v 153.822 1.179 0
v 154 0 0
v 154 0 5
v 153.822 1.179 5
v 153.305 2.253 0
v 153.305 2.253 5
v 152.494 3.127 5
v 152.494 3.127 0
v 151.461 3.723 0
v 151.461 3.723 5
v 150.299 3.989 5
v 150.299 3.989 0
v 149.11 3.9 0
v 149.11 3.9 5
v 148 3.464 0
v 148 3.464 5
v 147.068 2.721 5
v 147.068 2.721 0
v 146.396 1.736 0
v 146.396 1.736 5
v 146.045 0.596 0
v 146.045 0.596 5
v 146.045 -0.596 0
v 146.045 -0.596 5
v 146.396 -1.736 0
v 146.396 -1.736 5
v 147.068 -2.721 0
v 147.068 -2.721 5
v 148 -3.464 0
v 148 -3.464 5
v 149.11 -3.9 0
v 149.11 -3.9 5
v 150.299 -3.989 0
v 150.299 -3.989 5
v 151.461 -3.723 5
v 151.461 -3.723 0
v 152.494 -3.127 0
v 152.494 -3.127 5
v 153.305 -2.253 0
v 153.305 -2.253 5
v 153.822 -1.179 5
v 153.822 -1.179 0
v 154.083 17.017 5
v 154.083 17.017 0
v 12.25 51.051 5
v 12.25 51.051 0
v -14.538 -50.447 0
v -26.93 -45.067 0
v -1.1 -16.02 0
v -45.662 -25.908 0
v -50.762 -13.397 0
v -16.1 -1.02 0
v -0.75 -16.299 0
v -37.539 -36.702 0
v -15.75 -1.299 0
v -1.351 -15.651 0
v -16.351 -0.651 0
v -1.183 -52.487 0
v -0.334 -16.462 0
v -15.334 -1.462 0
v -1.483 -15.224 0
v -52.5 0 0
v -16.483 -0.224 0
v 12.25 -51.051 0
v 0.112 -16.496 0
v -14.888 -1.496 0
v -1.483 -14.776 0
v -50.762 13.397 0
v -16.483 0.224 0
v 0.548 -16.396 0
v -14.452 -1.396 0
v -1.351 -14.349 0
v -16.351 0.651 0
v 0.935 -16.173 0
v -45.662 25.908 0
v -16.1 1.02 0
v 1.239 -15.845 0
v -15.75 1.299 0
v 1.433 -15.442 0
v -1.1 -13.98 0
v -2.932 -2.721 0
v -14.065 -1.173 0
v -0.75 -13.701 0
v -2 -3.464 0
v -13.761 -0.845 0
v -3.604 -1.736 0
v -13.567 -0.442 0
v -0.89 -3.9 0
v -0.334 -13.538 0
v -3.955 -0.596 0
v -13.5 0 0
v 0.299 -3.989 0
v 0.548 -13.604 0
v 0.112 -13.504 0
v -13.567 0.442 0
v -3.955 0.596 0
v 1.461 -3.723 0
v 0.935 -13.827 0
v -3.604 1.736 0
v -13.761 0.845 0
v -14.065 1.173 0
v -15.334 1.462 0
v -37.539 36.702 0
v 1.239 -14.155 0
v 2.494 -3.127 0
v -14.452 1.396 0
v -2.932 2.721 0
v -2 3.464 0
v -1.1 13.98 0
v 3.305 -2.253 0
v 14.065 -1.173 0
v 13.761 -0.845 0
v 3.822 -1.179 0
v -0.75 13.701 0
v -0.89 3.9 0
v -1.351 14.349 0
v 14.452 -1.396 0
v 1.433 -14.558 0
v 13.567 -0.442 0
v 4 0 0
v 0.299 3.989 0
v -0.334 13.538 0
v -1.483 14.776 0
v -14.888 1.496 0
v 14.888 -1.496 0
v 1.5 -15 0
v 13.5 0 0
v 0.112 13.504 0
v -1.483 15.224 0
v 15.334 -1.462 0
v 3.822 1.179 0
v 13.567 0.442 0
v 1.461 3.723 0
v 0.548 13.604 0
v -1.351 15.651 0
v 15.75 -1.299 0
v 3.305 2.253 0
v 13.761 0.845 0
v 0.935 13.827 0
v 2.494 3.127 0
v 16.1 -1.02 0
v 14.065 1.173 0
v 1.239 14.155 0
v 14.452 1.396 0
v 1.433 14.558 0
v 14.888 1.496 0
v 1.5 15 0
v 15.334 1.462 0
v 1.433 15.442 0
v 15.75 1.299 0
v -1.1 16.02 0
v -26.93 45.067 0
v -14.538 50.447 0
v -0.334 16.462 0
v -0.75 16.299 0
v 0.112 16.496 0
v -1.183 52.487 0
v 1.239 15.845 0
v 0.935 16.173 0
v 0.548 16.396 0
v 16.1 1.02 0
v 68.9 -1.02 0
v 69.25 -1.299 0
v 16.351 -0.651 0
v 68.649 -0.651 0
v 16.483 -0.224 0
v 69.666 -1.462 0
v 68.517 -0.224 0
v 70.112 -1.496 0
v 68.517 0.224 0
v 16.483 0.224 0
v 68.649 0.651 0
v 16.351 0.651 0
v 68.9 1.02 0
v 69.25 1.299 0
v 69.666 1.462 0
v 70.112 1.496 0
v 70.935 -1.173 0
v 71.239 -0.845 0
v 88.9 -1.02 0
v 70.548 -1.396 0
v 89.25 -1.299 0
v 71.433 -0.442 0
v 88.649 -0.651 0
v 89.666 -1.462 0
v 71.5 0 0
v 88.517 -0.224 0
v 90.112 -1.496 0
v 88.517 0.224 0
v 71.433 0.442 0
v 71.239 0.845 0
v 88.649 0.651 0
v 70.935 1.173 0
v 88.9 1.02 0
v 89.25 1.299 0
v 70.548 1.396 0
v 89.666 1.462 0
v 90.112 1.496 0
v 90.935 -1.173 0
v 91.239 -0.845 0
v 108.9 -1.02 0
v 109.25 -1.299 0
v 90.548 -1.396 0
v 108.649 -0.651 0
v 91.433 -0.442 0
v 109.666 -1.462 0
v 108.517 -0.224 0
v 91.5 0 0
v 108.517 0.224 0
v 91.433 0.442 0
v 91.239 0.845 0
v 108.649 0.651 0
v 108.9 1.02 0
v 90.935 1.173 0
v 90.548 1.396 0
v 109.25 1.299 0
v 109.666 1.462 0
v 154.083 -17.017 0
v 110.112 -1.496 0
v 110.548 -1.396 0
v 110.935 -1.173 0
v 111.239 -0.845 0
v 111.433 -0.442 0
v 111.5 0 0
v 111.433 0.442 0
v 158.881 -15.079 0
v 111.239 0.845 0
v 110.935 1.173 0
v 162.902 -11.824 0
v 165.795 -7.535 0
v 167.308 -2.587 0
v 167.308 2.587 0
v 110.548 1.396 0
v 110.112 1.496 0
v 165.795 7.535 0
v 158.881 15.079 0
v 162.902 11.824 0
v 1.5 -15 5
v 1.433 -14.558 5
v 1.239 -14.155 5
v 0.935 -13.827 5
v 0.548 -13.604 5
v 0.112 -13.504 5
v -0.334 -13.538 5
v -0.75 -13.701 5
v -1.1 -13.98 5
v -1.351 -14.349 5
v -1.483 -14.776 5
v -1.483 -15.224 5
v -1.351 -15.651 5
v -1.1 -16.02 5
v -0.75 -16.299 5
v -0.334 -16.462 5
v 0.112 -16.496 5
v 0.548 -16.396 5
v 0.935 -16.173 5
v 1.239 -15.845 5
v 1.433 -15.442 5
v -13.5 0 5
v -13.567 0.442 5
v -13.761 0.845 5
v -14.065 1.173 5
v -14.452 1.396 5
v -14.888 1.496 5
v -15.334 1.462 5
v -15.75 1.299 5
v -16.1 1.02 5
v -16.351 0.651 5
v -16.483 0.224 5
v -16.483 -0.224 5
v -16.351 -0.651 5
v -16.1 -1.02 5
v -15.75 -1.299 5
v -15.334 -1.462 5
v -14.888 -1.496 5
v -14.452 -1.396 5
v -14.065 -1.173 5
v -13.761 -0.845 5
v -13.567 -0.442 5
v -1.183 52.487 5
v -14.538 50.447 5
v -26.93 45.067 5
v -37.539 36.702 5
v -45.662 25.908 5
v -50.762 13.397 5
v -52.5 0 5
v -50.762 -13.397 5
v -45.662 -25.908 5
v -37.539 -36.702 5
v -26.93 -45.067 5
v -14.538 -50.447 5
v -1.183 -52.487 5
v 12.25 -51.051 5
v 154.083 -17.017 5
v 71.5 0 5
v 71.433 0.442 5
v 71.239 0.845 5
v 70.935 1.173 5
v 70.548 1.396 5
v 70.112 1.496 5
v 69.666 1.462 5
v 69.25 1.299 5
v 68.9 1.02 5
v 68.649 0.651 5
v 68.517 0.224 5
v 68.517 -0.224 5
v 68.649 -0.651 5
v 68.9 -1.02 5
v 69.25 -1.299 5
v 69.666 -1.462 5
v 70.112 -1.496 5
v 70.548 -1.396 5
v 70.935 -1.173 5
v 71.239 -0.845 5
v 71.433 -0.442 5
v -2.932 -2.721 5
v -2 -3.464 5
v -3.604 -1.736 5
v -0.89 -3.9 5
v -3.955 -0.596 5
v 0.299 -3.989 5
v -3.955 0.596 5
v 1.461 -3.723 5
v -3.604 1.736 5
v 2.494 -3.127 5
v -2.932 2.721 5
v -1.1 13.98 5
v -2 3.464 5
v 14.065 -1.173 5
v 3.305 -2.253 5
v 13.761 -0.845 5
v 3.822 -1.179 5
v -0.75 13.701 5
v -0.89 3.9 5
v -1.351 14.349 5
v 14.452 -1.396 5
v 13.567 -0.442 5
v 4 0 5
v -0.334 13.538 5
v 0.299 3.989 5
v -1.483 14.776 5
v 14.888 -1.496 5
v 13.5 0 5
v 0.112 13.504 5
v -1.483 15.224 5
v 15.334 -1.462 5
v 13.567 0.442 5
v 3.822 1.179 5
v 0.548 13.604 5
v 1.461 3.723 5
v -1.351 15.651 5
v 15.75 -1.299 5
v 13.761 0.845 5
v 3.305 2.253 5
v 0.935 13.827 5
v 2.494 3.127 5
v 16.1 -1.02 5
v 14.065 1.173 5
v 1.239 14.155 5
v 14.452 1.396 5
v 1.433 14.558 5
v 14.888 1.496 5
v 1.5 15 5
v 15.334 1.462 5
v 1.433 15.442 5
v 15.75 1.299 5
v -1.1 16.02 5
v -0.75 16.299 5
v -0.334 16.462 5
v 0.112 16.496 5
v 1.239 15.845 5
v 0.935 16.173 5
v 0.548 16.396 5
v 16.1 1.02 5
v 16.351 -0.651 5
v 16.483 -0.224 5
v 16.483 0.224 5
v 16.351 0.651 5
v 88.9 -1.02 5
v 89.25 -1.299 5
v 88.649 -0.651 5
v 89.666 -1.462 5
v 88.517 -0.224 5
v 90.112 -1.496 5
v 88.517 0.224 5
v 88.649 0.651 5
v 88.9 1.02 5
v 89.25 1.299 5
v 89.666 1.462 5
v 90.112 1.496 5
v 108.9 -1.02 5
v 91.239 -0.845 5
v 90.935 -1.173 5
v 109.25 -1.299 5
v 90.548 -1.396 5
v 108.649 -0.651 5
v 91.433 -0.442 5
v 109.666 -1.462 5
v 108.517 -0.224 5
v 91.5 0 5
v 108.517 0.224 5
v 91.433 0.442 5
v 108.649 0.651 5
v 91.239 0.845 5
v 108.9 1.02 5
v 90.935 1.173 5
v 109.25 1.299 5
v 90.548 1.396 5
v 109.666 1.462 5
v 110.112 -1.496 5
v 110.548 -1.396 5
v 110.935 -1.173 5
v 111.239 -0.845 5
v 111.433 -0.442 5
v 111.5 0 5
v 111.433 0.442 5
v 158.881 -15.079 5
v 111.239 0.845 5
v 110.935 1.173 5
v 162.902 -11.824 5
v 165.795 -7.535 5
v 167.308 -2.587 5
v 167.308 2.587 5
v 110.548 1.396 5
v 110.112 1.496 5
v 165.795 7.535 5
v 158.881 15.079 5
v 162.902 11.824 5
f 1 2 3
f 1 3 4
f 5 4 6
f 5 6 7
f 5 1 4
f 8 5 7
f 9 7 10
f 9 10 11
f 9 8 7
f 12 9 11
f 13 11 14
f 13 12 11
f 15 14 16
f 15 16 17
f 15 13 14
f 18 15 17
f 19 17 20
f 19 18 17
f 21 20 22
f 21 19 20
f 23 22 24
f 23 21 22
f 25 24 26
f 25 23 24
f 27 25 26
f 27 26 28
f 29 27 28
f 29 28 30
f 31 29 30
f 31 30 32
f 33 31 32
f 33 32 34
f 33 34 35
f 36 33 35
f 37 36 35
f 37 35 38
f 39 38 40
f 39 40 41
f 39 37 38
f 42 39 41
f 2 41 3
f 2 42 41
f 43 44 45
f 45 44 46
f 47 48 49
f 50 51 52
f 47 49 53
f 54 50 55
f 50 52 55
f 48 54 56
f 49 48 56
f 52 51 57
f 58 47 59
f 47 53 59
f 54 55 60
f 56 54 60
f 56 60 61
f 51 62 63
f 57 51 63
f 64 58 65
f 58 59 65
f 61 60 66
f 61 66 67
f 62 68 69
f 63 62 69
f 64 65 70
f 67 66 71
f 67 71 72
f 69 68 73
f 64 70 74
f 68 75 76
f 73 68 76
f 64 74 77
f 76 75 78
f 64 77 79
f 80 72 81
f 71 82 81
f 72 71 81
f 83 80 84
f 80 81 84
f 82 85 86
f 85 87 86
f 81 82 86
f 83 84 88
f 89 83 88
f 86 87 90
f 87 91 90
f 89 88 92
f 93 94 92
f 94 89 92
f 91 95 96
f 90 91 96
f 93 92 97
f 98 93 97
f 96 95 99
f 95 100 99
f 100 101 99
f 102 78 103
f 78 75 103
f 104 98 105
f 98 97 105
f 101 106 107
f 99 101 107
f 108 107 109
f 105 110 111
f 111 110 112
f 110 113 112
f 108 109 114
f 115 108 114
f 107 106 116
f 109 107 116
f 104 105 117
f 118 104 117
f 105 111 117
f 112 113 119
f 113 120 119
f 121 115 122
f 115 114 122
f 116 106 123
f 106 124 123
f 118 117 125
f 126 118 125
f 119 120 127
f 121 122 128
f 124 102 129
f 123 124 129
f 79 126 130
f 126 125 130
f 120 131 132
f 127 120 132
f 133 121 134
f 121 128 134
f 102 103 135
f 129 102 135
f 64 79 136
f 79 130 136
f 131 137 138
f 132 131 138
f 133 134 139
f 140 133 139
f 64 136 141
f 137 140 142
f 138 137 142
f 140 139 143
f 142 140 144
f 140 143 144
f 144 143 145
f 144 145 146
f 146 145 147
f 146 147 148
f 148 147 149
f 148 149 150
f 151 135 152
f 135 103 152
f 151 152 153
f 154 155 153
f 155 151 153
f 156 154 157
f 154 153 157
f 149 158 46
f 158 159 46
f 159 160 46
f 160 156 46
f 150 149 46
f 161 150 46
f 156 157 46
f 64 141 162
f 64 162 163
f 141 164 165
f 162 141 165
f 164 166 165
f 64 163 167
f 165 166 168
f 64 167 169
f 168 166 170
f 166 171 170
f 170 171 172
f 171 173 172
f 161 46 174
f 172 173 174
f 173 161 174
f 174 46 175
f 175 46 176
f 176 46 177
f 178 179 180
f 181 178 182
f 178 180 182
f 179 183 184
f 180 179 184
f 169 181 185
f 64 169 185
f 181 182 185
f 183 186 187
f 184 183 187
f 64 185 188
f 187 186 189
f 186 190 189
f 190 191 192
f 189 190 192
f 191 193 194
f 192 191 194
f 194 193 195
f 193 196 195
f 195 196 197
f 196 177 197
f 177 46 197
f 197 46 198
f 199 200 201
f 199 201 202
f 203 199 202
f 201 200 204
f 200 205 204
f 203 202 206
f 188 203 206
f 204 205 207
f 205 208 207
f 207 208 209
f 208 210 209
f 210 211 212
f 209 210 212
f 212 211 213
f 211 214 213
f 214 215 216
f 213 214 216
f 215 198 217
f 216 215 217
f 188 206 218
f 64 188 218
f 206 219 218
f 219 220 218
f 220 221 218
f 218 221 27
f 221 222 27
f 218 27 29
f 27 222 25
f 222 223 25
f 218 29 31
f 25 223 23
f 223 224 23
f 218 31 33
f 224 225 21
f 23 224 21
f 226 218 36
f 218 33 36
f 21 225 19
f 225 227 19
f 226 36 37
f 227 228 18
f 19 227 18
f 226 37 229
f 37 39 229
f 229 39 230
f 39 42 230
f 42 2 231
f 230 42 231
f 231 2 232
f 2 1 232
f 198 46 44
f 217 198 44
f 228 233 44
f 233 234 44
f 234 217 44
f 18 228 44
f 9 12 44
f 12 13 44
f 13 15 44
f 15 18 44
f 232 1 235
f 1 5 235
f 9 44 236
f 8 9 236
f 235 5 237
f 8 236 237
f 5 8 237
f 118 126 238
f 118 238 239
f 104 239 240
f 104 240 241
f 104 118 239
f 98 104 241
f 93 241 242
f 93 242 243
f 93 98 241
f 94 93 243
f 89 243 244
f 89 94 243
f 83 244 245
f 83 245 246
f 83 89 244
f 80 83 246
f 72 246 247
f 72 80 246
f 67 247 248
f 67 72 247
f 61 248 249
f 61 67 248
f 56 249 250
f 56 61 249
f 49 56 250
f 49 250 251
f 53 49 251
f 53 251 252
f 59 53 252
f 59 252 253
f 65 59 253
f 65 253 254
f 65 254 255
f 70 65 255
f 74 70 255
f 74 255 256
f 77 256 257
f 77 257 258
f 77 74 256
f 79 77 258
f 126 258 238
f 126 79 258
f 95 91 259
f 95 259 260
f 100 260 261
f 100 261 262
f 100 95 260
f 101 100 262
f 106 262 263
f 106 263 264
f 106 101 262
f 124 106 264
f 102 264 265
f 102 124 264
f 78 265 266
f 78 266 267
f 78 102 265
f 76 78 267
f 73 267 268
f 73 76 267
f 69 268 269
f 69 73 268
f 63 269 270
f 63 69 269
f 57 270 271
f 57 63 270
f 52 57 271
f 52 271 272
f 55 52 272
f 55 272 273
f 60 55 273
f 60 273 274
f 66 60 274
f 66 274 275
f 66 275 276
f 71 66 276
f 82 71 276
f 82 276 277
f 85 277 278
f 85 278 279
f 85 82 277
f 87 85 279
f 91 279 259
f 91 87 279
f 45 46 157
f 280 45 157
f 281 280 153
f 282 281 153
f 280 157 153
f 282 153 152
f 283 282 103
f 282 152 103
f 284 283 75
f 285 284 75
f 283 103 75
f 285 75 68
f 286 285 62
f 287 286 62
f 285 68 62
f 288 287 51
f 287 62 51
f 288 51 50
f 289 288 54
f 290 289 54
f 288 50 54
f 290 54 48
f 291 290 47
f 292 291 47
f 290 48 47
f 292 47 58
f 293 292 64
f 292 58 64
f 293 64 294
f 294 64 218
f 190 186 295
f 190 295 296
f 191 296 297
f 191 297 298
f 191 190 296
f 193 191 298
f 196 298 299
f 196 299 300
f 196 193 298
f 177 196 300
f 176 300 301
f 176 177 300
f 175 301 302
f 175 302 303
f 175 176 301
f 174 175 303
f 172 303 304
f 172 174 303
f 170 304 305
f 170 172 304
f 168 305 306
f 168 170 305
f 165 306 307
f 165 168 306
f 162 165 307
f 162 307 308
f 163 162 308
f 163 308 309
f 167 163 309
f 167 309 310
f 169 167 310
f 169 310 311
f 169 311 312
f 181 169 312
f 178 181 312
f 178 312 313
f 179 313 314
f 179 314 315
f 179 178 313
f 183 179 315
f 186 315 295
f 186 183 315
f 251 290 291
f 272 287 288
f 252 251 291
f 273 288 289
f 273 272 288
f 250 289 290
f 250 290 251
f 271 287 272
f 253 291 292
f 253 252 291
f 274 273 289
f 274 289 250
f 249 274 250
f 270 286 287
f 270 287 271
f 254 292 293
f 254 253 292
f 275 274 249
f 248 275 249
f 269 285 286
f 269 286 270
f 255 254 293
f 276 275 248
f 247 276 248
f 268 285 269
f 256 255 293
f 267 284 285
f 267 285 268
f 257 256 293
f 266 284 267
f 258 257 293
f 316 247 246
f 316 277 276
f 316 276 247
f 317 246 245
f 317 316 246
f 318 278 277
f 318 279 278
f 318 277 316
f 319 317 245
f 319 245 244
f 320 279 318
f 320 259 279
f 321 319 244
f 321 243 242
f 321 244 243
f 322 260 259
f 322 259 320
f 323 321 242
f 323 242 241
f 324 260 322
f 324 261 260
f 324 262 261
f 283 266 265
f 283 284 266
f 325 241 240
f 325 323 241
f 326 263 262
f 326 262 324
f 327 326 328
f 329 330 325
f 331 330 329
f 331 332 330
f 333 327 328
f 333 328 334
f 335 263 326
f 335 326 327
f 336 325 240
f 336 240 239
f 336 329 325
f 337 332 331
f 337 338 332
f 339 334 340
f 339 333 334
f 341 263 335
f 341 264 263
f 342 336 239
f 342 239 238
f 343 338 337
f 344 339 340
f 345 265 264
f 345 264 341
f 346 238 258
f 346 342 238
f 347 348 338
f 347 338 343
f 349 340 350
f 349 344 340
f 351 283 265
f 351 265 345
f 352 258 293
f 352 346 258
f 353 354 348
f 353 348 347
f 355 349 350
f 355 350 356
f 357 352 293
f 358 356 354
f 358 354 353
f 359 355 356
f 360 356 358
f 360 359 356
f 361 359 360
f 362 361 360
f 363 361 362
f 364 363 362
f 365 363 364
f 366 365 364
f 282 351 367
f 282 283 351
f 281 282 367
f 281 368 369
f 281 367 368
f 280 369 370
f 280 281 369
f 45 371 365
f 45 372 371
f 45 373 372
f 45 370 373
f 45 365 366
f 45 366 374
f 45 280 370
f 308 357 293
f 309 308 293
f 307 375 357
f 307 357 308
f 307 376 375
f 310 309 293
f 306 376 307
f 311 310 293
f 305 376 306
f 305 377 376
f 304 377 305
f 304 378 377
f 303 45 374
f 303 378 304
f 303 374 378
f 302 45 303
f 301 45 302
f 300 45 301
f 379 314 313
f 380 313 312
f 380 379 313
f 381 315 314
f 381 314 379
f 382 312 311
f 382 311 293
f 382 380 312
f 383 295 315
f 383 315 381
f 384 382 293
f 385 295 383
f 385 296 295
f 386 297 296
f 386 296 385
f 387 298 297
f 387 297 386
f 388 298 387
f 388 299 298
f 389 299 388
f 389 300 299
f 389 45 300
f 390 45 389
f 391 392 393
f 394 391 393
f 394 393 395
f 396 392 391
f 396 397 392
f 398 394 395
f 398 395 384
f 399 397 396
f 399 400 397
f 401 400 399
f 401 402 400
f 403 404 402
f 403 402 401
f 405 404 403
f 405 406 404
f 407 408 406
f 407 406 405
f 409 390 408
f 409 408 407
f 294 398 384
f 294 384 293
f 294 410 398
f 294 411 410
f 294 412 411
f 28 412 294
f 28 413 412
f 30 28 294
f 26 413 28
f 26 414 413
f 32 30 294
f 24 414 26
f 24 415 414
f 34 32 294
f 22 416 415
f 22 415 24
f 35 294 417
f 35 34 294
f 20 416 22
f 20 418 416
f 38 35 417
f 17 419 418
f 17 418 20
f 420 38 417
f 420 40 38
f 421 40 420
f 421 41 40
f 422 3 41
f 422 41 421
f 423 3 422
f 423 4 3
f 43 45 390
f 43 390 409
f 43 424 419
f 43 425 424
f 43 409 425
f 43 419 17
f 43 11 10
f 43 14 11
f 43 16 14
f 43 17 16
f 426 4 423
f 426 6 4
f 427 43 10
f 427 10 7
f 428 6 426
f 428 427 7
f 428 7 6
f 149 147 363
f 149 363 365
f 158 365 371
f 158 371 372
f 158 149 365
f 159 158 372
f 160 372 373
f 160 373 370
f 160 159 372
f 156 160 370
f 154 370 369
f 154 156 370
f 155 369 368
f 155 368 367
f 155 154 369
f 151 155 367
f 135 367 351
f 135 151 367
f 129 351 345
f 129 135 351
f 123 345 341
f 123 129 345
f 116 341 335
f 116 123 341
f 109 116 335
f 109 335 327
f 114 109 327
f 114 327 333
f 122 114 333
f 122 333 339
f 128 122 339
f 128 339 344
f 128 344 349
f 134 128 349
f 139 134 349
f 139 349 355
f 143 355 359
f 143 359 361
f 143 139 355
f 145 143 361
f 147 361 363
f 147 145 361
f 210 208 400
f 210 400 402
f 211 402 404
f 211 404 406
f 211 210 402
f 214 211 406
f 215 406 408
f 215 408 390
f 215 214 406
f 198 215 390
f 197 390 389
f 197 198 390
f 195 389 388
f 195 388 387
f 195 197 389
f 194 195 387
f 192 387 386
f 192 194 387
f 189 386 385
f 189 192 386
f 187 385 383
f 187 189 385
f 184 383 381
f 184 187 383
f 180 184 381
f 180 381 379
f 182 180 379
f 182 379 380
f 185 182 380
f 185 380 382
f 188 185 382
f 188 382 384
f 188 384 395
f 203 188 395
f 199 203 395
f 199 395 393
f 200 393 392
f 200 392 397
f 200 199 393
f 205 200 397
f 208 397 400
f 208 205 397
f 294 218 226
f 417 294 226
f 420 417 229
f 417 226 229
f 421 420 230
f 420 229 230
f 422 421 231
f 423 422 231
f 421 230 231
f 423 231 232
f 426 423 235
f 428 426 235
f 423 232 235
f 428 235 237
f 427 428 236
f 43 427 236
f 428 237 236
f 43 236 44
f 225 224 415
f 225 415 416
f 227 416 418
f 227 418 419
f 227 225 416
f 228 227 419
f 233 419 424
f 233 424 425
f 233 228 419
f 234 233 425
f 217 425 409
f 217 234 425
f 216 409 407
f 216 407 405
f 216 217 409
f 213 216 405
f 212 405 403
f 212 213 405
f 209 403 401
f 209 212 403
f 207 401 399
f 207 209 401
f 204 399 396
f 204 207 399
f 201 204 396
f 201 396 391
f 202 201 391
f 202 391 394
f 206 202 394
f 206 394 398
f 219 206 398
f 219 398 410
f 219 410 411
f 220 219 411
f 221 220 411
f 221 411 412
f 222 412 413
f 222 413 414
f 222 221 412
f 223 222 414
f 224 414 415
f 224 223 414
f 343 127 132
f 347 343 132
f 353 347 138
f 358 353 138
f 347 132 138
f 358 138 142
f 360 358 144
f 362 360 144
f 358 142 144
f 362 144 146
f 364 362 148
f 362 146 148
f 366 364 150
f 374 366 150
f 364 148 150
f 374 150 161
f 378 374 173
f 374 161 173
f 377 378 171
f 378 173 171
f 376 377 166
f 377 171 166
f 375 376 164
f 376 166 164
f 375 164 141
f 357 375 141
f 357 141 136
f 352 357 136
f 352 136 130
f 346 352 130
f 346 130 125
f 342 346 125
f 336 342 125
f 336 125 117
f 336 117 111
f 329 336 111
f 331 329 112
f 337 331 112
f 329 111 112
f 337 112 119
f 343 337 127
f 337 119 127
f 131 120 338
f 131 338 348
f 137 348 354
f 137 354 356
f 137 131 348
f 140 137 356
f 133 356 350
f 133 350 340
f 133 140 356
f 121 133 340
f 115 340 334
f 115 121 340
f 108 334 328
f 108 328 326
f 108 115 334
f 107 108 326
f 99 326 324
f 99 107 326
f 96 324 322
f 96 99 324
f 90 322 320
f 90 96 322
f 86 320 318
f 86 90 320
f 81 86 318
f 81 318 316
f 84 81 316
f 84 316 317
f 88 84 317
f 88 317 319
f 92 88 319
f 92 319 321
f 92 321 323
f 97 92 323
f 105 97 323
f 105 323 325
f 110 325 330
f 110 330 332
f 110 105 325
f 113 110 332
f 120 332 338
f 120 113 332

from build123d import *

# Parameters (mm, degrees)
SKETCH1_R           = 1.5
SKETCH1_R_2         = 4
BOSS_EXTRUDE1_DEPTH = 5


with BuildPart() as part:
    # Sketch1 → Boss-Extrude1 (new body)
    with BuildSketch(Plane.XY):
        with BuildLine():
            ThreePointArc((12.25, 51.05083251), (-52.5, 0), (12.25, -51.05083251))
            Line((12.25, -51.05083251), (154.083333333, -17.01694417))
            ThreePointArc((154.083333333, -17.01694417), (167.5, 0), (154.083333333, 17.01694417))
            Line((154.083333333, 17.01694417), (12.25, 51.05083251))
        make_face()
        with Locations((0, -15)):
            Circle(SKETCH1_R, mode=Mode.SUBTRACT)
        with Locations((-15, 0)):
            Circle(SKETCH1_R, mode=Mode.SUBTRACT)
        Circle(SKETCH1_R_2, mode=Mode.SUBTRACT)
        with BuildLine():
            ThreePointArc((16.5, 0), (15, -1.5), (13.5, 0))
            ThreePointArc((13.5, 0), (15, 1.5), (16.5, 0))
        make_face(mode=Mode.SUBTRACT)
        with Locations((0, 15)):
            Circle(SKETCH1_R, mode=Mode.SUBTRACT)
        with Locations((70, 0)):
            Circle(SKETCH1_R, mode=Mode.SUBTRACT)
        with Locations((90, 0)):
            Circle(SKETCH1_R, mode=Mode.SUBTRACT)
        with Locations((110, 0)):
            Circle(SKETCH1_R, mode=Mode.SUBTRACT)
        with Locations((150, 0)):
            Circle(SKETCH1_R_2, mode=Mode.SUBTRACT)
    extrude(amount=BOSS_EXTRUDE1_DEPTH)


solid = part.part
